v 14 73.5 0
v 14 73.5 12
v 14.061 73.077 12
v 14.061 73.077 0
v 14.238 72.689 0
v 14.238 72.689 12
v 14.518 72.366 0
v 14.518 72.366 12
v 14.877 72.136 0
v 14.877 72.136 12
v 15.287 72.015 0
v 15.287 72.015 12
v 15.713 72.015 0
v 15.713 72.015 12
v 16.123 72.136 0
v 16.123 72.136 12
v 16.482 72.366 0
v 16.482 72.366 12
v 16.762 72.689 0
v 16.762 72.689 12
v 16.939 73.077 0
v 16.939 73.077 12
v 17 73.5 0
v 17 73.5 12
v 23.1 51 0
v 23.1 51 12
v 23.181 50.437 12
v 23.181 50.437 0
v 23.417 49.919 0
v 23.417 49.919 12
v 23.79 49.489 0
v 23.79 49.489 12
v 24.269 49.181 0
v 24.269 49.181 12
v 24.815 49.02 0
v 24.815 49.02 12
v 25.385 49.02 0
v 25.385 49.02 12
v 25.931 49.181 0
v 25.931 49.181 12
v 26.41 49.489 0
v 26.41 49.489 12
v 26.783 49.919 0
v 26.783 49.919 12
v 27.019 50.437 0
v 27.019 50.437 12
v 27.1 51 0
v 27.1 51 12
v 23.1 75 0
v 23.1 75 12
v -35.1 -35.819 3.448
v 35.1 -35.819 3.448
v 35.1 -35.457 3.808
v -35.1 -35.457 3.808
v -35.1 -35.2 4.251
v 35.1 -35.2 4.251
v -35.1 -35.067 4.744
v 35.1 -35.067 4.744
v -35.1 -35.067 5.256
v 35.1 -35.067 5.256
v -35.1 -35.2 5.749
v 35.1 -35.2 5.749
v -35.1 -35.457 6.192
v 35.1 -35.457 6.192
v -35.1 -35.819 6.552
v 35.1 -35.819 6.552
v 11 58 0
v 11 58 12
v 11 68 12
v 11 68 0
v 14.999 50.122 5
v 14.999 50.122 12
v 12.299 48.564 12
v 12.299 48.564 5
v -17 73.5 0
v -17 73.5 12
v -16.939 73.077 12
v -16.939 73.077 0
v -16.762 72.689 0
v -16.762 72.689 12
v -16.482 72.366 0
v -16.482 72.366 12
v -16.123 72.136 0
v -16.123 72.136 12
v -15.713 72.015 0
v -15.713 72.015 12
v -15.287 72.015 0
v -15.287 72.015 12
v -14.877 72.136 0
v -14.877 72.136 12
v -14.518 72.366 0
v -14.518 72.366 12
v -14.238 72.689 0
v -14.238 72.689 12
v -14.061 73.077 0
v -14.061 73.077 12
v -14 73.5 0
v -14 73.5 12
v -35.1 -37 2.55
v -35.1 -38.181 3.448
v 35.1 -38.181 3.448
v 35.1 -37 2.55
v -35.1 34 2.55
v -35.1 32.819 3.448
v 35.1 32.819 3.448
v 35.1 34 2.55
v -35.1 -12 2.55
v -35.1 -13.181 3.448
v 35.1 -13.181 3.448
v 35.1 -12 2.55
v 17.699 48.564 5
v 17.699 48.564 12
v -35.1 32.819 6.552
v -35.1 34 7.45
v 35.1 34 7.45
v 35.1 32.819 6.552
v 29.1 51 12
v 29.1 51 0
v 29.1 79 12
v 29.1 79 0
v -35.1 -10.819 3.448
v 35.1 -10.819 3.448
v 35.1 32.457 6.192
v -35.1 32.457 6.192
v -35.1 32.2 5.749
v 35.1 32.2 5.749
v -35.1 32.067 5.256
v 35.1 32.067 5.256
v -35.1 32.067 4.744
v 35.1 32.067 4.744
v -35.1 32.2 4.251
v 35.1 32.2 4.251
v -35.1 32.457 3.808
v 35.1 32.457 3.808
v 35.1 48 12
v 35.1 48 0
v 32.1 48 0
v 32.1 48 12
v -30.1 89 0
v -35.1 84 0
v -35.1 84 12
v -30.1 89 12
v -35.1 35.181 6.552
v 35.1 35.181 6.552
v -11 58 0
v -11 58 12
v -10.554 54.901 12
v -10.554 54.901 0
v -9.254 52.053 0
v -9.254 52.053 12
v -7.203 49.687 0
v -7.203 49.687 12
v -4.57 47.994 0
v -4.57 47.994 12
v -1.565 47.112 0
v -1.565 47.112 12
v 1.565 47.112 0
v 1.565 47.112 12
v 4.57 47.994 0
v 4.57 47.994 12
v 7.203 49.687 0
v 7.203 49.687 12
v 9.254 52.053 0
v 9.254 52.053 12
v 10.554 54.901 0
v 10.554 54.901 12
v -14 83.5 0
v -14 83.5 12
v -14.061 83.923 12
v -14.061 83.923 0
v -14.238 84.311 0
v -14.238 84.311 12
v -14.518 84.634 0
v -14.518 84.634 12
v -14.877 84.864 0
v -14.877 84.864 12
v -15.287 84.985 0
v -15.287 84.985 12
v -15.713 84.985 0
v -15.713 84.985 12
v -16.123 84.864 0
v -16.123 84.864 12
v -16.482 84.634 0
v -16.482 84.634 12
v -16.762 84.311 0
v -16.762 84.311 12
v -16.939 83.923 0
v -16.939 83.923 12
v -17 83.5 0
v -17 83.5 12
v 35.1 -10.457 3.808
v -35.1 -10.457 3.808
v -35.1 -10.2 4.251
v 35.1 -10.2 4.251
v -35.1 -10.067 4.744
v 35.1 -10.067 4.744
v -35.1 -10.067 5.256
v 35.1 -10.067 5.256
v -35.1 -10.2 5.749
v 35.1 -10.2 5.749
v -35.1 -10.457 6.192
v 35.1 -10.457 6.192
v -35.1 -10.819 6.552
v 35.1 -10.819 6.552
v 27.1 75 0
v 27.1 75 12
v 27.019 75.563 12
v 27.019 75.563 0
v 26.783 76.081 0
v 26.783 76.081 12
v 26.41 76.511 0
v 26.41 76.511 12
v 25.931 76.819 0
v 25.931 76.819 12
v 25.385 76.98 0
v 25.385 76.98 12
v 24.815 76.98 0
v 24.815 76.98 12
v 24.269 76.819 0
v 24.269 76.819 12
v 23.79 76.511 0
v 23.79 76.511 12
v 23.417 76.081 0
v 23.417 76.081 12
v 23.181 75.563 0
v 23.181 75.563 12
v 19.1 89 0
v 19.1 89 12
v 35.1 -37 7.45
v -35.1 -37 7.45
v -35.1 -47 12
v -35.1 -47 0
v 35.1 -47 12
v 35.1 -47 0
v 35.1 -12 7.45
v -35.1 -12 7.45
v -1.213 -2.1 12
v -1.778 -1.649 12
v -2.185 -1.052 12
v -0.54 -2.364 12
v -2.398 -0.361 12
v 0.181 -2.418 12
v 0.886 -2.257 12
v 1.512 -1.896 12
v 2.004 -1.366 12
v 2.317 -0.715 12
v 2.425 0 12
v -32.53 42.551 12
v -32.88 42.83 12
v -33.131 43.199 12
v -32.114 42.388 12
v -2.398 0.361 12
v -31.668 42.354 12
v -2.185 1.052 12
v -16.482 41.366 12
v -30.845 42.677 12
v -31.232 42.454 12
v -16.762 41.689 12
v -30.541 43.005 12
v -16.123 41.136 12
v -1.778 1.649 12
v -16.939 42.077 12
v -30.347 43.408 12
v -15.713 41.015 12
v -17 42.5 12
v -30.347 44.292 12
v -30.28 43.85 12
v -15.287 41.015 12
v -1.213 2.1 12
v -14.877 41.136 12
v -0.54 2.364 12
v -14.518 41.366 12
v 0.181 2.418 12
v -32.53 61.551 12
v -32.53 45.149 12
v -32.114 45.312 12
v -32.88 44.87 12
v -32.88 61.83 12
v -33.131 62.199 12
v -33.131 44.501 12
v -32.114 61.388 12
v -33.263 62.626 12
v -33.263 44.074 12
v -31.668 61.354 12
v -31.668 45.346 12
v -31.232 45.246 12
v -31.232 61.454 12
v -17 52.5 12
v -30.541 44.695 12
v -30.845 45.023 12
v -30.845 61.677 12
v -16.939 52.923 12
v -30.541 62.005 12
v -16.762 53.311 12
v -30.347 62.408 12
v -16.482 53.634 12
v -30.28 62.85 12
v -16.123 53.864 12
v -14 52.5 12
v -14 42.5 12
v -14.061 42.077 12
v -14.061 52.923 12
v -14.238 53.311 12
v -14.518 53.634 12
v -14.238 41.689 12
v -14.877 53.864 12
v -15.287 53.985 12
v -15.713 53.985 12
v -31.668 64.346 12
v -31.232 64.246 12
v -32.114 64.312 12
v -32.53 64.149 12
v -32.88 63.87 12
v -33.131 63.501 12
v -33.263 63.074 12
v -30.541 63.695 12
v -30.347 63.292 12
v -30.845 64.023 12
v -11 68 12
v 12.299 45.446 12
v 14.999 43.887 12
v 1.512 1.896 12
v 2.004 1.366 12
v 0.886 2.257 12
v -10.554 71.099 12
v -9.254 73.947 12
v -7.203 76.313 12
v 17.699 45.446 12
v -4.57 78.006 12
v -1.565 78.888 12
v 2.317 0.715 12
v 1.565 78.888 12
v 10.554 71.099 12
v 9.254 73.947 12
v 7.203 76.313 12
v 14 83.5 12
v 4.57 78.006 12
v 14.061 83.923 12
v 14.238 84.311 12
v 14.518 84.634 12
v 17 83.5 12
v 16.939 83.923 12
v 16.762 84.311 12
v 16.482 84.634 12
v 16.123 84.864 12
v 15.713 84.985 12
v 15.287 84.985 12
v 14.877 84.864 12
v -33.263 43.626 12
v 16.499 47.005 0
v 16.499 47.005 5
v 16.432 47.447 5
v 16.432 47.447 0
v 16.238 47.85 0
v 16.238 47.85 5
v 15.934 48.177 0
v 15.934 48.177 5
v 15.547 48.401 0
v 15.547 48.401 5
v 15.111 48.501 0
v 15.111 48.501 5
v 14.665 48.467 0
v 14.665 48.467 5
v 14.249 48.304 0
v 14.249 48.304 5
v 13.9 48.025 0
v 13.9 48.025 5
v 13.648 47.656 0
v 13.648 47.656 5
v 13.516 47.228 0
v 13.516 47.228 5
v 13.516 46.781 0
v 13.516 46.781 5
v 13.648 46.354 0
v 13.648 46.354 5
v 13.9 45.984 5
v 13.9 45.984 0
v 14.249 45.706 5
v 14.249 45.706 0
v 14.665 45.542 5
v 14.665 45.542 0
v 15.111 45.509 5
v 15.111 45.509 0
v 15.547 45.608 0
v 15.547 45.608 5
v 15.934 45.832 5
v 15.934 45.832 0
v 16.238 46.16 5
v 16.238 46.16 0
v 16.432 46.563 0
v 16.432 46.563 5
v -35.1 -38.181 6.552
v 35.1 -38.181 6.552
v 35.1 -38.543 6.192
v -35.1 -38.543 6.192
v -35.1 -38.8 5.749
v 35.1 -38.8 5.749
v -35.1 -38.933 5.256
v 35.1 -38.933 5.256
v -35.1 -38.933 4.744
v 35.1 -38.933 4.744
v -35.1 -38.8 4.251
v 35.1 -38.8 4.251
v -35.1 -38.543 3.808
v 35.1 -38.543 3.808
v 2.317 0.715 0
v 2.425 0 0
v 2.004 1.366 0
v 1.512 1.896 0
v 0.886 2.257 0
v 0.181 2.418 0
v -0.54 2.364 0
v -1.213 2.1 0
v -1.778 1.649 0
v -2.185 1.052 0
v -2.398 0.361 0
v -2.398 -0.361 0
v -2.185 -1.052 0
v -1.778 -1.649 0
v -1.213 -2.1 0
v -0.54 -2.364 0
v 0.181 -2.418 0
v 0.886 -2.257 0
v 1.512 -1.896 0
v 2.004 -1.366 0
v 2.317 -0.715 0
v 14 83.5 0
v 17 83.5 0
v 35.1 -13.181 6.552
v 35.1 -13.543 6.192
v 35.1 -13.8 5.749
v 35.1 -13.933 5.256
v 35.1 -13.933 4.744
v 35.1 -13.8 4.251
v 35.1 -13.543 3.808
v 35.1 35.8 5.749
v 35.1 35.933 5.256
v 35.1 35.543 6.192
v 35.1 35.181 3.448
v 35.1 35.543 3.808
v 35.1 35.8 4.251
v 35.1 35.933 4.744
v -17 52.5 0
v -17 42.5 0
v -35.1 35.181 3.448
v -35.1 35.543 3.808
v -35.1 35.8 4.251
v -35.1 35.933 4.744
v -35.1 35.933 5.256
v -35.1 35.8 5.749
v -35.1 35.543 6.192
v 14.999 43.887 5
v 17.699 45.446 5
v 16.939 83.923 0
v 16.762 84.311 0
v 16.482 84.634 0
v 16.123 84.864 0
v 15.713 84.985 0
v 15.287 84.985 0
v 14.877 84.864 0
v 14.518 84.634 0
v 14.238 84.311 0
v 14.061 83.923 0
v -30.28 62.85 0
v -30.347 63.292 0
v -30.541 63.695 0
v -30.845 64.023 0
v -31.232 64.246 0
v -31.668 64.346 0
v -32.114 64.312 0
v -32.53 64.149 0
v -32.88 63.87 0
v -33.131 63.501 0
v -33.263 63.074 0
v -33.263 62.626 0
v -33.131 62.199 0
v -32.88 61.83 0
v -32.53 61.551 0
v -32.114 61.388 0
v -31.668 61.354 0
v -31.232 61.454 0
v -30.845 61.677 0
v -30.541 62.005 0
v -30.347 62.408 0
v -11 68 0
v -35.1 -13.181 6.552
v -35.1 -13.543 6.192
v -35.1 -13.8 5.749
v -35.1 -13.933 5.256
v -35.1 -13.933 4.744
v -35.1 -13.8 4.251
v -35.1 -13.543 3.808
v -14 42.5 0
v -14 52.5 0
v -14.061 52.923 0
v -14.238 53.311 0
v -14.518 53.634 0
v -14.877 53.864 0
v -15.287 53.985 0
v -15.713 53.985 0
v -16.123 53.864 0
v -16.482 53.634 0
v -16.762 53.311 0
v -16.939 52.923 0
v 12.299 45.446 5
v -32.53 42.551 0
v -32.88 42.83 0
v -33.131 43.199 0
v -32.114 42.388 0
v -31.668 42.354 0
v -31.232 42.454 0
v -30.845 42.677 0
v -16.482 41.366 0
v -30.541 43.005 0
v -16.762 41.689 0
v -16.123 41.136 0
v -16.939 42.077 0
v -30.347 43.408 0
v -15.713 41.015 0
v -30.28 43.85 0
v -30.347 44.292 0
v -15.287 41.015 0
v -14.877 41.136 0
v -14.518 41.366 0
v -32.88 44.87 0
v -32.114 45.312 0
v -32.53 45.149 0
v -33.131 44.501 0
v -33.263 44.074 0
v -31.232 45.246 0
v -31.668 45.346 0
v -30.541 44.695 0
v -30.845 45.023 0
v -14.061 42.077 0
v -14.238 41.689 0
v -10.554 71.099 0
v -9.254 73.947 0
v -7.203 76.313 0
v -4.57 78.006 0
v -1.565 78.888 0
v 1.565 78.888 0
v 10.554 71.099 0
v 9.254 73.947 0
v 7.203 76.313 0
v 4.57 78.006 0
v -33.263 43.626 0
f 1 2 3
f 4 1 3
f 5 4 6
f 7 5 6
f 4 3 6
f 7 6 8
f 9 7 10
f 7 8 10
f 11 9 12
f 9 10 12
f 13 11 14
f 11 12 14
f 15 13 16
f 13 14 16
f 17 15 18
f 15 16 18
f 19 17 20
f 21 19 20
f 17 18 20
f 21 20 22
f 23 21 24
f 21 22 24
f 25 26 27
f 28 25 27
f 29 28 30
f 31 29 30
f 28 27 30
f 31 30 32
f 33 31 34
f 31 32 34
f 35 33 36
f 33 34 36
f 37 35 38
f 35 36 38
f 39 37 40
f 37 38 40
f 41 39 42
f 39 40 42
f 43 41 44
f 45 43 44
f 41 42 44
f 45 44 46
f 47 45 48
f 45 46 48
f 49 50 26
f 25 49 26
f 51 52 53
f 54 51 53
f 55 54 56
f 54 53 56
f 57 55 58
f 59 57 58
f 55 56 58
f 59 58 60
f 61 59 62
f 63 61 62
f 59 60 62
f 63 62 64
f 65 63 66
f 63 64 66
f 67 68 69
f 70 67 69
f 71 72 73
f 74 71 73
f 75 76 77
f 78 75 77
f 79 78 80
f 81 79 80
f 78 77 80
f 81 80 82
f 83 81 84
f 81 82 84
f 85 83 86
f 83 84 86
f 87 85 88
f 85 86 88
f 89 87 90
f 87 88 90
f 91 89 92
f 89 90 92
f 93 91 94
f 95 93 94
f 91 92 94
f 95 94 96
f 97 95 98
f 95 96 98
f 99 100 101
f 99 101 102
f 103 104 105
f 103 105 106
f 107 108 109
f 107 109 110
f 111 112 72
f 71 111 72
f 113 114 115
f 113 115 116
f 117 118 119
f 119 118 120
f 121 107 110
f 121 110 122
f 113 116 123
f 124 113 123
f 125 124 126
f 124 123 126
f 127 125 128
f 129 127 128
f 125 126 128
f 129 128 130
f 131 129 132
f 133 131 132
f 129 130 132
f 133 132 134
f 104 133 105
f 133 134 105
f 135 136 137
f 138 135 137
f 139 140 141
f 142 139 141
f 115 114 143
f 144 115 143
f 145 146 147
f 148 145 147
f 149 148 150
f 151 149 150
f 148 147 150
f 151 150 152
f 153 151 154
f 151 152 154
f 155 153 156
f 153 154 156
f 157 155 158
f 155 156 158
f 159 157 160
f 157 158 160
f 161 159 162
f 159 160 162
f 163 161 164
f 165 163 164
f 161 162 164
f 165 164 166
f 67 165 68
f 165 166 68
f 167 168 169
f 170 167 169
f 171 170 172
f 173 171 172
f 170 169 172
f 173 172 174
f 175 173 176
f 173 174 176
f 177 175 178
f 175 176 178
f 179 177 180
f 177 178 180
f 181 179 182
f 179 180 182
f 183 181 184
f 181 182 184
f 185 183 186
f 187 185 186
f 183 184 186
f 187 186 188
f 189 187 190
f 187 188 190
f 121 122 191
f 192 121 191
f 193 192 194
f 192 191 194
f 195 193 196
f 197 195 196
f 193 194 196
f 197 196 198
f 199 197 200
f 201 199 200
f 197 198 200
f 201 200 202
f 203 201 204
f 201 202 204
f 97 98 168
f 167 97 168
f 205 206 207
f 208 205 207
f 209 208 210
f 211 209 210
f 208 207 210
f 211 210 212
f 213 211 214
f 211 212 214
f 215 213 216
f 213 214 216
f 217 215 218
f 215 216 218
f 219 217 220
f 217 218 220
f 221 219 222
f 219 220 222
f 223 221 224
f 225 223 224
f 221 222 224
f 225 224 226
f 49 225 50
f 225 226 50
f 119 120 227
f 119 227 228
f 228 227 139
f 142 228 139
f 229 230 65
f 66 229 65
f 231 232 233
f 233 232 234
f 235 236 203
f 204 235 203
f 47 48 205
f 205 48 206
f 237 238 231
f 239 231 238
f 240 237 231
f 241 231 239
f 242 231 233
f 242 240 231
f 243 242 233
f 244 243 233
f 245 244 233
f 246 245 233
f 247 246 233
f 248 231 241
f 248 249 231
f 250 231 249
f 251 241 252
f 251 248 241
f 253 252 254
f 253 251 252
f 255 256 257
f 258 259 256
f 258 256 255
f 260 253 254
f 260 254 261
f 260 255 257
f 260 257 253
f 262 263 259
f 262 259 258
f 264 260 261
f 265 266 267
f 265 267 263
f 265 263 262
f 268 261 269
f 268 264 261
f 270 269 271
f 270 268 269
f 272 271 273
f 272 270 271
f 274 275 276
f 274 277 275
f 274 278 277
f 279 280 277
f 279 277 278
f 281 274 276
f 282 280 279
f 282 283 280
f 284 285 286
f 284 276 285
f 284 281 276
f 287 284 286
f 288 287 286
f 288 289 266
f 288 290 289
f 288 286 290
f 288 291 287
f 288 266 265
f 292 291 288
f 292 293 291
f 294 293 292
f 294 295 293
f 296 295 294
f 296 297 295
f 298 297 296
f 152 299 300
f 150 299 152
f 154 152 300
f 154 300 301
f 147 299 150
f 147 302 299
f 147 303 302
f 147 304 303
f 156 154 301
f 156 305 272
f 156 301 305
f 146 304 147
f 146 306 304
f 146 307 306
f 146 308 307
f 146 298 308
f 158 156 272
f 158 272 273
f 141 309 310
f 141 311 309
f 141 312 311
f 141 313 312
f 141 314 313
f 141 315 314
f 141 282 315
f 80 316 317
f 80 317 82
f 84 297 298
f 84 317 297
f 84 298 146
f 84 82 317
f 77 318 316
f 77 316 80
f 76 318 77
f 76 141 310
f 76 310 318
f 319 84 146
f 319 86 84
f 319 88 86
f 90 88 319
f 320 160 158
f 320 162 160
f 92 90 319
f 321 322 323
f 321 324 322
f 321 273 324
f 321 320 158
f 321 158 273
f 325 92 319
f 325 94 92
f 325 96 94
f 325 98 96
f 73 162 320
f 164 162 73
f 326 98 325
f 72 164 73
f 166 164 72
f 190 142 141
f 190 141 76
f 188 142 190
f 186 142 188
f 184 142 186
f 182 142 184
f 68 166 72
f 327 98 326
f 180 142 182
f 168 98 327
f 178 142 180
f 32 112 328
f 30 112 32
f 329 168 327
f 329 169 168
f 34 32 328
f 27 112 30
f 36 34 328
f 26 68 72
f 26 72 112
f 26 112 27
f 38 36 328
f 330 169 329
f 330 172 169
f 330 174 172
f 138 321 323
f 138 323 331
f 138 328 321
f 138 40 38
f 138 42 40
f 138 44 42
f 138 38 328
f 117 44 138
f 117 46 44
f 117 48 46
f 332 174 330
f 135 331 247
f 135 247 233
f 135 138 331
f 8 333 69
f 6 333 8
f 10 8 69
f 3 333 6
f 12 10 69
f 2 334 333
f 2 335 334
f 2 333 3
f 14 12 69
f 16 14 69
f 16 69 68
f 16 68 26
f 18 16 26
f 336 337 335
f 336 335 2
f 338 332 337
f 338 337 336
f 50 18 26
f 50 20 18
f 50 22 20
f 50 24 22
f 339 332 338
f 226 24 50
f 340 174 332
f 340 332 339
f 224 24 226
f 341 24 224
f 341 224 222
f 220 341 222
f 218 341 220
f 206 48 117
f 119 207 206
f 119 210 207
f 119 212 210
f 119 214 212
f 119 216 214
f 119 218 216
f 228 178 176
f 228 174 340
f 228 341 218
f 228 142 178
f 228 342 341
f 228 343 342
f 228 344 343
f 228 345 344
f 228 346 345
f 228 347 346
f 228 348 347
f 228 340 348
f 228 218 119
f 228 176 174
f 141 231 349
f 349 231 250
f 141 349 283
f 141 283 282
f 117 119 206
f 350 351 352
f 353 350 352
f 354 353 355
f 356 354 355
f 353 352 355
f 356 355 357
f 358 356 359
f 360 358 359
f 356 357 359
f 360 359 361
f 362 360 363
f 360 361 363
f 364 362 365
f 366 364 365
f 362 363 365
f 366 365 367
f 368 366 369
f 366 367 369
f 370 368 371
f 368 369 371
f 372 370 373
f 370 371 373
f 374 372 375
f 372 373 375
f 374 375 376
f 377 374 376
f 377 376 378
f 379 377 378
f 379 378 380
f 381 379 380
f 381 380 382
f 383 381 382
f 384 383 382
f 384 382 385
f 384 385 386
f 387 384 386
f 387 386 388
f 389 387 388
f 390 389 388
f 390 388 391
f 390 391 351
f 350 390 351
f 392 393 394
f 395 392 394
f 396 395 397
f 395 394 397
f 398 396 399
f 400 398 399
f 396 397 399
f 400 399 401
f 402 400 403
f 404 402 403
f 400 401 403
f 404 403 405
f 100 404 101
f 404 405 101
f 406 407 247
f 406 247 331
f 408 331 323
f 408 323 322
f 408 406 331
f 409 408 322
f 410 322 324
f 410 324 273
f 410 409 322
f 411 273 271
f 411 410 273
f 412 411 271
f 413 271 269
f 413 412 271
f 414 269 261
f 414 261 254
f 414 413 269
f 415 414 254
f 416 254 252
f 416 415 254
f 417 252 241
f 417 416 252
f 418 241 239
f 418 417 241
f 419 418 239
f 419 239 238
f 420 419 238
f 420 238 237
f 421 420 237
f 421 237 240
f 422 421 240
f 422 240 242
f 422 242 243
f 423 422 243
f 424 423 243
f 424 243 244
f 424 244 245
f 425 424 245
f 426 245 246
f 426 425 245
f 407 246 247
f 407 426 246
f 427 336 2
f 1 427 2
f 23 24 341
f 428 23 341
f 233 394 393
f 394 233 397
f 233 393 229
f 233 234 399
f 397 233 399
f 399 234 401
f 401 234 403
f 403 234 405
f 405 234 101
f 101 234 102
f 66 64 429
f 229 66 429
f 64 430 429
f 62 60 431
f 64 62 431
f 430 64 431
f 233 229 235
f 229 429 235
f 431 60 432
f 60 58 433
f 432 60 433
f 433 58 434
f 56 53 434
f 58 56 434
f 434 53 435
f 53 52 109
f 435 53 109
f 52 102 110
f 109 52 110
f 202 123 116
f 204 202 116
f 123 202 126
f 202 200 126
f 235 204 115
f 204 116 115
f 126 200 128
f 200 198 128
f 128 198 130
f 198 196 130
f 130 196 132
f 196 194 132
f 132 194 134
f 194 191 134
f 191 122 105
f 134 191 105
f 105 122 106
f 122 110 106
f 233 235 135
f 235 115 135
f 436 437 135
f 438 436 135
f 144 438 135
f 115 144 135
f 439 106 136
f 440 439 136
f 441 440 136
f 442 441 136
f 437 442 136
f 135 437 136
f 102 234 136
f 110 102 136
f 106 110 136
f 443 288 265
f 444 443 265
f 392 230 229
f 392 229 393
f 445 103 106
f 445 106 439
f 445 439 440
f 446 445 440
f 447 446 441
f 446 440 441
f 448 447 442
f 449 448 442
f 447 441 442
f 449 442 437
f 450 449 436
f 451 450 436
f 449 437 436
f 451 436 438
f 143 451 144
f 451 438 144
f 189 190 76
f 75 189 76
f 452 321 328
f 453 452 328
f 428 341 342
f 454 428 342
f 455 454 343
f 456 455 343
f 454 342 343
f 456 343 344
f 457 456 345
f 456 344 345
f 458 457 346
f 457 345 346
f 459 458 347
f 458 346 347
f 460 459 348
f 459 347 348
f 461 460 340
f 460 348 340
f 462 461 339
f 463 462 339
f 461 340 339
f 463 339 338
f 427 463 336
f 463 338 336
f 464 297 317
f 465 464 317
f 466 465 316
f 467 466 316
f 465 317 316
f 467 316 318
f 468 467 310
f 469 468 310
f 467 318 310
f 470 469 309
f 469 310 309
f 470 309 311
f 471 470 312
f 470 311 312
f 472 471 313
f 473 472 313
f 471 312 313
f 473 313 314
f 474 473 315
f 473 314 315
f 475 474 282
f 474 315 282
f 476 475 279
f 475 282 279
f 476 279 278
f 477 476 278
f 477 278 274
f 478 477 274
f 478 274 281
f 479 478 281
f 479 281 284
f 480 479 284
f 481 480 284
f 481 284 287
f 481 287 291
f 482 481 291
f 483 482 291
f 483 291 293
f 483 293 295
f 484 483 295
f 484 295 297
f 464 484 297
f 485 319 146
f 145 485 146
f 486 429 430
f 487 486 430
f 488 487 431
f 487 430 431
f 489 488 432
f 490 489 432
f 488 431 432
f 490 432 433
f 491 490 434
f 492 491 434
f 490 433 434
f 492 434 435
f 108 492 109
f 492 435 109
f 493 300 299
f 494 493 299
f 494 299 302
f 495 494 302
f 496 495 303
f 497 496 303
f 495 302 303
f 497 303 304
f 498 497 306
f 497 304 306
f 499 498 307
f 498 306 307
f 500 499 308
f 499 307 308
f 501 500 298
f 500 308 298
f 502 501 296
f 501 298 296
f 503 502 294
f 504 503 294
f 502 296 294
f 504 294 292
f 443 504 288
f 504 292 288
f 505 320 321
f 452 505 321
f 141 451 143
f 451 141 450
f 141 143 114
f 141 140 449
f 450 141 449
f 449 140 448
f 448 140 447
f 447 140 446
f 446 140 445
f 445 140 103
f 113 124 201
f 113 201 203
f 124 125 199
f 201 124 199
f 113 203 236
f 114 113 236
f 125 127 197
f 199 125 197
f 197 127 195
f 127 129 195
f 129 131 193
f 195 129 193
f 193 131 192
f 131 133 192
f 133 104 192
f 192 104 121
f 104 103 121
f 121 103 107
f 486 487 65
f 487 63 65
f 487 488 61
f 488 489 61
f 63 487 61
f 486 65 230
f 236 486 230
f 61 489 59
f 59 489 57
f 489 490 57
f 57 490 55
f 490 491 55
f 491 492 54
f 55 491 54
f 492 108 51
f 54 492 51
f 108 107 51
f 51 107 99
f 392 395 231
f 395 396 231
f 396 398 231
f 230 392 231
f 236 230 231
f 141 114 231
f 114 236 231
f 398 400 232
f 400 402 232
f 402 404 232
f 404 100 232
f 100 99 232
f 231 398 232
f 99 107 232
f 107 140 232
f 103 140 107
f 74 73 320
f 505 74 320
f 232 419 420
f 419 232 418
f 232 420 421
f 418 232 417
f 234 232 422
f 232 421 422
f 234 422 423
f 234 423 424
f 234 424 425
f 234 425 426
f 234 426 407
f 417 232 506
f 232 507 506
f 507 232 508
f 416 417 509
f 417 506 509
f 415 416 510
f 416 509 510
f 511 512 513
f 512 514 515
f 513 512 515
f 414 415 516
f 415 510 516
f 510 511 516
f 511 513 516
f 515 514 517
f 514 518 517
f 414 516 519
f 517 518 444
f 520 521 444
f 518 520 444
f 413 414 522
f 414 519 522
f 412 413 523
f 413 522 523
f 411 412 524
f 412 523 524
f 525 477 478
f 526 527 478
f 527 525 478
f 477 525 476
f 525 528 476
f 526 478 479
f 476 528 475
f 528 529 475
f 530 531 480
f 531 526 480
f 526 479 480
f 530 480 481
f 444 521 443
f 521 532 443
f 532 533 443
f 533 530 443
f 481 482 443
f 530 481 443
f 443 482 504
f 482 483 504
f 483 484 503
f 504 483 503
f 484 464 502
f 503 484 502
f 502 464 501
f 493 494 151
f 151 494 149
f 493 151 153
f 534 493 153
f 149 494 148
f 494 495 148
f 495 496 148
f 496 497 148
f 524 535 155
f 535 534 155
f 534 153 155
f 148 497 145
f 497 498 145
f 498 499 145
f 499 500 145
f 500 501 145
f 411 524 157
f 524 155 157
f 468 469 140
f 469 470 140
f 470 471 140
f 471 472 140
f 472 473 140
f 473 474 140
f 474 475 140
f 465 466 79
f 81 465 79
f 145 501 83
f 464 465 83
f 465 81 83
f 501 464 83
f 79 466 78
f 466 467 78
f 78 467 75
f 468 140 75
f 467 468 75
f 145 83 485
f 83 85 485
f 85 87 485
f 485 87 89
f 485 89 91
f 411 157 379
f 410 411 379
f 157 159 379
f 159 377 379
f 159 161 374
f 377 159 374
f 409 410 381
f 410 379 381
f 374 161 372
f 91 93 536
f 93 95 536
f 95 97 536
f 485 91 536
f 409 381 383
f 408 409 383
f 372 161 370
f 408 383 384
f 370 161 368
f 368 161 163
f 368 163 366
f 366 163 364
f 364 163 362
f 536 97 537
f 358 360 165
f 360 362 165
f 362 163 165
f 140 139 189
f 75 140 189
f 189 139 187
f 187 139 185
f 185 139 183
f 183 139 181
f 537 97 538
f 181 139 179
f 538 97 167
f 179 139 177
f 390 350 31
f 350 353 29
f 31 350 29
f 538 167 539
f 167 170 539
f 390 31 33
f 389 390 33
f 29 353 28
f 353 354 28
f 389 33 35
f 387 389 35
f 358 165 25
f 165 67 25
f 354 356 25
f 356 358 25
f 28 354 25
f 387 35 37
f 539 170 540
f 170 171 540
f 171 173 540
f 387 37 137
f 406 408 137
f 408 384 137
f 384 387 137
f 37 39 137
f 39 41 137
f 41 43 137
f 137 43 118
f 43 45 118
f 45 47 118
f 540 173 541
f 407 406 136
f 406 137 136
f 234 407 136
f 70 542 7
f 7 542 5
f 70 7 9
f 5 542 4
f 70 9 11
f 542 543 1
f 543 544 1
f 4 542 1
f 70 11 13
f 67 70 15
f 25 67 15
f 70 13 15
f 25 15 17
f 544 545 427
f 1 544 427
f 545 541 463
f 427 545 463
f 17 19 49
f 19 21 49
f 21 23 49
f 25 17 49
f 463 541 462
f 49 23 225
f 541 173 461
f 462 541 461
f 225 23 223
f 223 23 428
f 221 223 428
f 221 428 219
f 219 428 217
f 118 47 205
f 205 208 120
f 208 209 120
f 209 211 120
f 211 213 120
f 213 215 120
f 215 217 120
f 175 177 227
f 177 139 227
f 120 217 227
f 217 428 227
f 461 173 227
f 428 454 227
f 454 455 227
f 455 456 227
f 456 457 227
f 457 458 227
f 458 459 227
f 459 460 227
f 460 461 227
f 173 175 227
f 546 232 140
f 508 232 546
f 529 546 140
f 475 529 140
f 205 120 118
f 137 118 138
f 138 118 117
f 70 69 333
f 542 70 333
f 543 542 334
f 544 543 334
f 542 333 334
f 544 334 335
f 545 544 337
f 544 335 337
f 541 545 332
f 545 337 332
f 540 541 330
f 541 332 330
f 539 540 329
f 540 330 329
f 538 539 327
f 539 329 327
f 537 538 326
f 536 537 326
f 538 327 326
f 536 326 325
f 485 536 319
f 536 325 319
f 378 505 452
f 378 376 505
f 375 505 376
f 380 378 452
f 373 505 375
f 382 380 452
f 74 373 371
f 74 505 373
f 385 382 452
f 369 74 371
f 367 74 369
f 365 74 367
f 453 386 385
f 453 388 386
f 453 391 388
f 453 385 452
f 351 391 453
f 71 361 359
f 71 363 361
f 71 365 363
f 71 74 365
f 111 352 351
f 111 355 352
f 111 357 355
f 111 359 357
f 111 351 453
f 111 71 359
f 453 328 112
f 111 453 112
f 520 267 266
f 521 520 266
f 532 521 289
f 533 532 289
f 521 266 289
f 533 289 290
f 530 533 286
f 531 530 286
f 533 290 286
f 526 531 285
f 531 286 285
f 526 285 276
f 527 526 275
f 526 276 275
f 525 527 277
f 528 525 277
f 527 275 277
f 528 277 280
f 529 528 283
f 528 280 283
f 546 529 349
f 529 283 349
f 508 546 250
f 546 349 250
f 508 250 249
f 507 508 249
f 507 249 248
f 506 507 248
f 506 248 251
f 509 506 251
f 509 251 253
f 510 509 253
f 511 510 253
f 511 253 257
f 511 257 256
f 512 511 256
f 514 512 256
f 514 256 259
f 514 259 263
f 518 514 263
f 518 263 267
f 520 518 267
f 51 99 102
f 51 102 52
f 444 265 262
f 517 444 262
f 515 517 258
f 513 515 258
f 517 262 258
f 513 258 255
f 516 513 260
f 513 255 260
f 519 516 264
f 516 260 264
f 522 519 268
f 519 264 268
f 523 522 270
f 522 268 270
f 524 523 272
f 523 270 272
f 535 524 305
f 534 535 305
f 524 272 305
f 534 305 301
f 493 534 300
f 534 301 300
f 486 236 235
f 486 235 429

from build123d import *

# Parameters (mm, degrees)
SKETCH_R               = 2.425
PAD_DEPTH              = 12
POCKET_DEPTH           = 20
POCKET001_DEPTH        = 20
SKETCH003_R            = 1.5
POCKET002_DEPTH        = 20
SKETCH004_R            = 1.5
POCKET003_DEPTH        = 20
POCKET004_DEPTH        = 7
POCKET005_DEPTH        = 100
LINEARPATTERN_COUNT    = 2
LINEARPATTERN_PITCH    = 25
LINEARPATTERN001_COUNT = 2
LINEARPATTERN001_PITCH = 71
CHAMFER_SIZE           = 3
CHAMFER001_SIZE        = 10
CHAMFER002_SIZE        = 5


with BuildPart() as part:
    # Sketch → Pad (new body)
    with BuildSketch(Plane.XY):
        Polygon((-35.1, -47), (35.1, -47), (35.1, 48), (29.1, 48), (29.1, 89), (-35.1, 89), align=None)
        Circle(SKETCH_R, mode=Mode.SUBTRACT)
    extrude(amount=PAD_DEPTH)

    # Sketch001 (on Face9 of Pad) → Pocket (cut)
    with BuildSketch(Plane.XY.offset(12)):
        with BuildLine():
            ThreePointArc((11, 68), (0, 79), (-11, 68))
            Line((-11, 68), (-11, 58))
            ThreePointArc((-11, 58), (0, 47), (11, 58))
            Line((11, 58), (11, 68))
        make_face()
        with BuildLine():
            ThreePointArc((-14, 83.5), (-15.5, 85), (-17, 83.5))
            Line((-17, 83.5), (-17, 73.5))
            ThreePointArc((-17, 73.5), (-15.5, 72), (-14, 73.5))
            Line((-14, 73.5), (-14, 83.5))
        make_face()
        with BuildLine():
            ThreePointArc((-14, 52.5), (-15.5, 54), (-17, 52.5))
            Line((-17, 52.5), (-17, 42.5))
            ThreePointArc((-17, 42.5), (-15.5, 41), (-14, 42.5))
            Line((-14, 42.5), (-14, 52.5))
        make_face()
        with BuildLine():
            ThreePointArc((17, 83.5), (15.5, 85), (14, 83.5))
            Line((14, 83.5), (14, 73.5))
            ThreePointArc((14, 73.5), (15.5, 72), (17, 73.5))
            Line((17, 73.5), (17, 83.5))
        make_face()
    extrude(amount=-POCKET_DEPTH, mode=Mode.SUBTRACT)

    # Sketch002 (on Face5 of Pocket) → Pocket001 (cut)
    with BuildSketch(Plane.XY.offset(12)):
        with BuildLine():
            ThreePointArc((27.1, 75), (25.1, 77), (23.1, 75))
            Line((23.1, 75), (23.1, 51))
            ThreePointArc((23.1, 51), (25.1, 49), (27.1, 51))
            Line((27.1, 51), (27.1, 75))
        make_face()
    extrude(amount=-POCKET001_DEPTH, mode=Mode.SUBTRACT)

    # Sketch003 (on Face5 of Pocket001) → Pocket002 (cut)
    with BuildSketch(Plane.XY.offset(12)):
        with Locations((-31.78, 62.85)):
            Circle(SKETCH003_R)
        with Locations((-31.78, 43.85)):
            Circle(SKETCH003_R)
    extrude(amount=-POCKET002_DEPTH, mode=Mode.SUBTRACT)

    # Sketch004 (on Face5 of Pocket002) → Pocket003 (cut)
    with BuildSketch(Plane.XY.offset(12)):
        with Locations((14.999119, 47.004734)):
            Circle(SKETCH004_R)
    extrude(amount=-POCKET003_DEPTH, mode=Mode.SUBTRACT)

    # Sketch005 (on Face5 of Pocket003) → Pocket004 (cut)
    with BuildSketch(Plane.XY.offset(12)):
        Polygon((14.999119, 43.887043), (17.699119, 45.445888), (17.699119, 48.56358), (14.999119, 50.122425), (12.299119, 48.56358), (12.299119, 45.445888), align=None)
    extrude(amount=-POCKET004_DEPTH, mode=Mode.SUBTRACT)

    # Sketch006 (on Face3 of Pocket004) → Pocket005 (cut)
    with BuildSketch(Plane.YZ.offset(35.1)):
        with BuildLine():
            ThreePointArc((-38.180538, 6.552041), (-38.95, 5), (-38.180538, 3.447959))
            Line((-38.180538, 3.447959), (-37, 2.55))
            Line((-37, 2.55), (-35.819462, 3.447959))
            ThreePointArc((-35.819462, 3.447959), (-35.05, 5), (-35.819462, 6.552041))
            Line((-37, 7.45), (-35.819462, 6.552041))
            Line((-37, 7.45), (-38.180538, 6.552041))
        make_face()
    pocket005 = extrude(amount=-POCKET005_DEPTH, mode=Mode.SUBTRACT)

    # LinearPattern: Pocket005 ×2
    with Locations(*[(0, i * LINEARPATTERN_PITCH, 0) for i in range(1, LINEARPATTERN_COUNT)]):
        add(pocket005, mode=Mode.SUBTRACT)

    # LinearPattern001: Pocket005 ×2
    with Locations(*[(0, i * LINEARPATTERN001_PITCH, 0) for i in range(1, LINEARPATTERN001_COUNT)]):
        add(pocket005, mode=Mode.SUBTRACT)

    # Chamfer
    chamfer_edges = [part.edges().sort_by_distance(p)[0] for p in [
        (29.1, 48, 6),
    ]]
    chamfer(chamfer_edges, length=CHAMFER_SIZE)

    # Chamfer001
    chamfer001_edges = [part.edges().sort_by_distance(p)[0] for p in [
        (29.1, 89, 6),
    ]]
    chamfer(chamfer001_edges, length=CHAMFER001_SIZE)

    # Chamfer002
    chamfer002_edges = [part.edges().sort_by_distance(p)[0] for p in [
        (-35.1, 89, 6),
    ]]
    chamfer(chamfer002_edges, length=CHAMFER002_SIZE)


solid = part.part
